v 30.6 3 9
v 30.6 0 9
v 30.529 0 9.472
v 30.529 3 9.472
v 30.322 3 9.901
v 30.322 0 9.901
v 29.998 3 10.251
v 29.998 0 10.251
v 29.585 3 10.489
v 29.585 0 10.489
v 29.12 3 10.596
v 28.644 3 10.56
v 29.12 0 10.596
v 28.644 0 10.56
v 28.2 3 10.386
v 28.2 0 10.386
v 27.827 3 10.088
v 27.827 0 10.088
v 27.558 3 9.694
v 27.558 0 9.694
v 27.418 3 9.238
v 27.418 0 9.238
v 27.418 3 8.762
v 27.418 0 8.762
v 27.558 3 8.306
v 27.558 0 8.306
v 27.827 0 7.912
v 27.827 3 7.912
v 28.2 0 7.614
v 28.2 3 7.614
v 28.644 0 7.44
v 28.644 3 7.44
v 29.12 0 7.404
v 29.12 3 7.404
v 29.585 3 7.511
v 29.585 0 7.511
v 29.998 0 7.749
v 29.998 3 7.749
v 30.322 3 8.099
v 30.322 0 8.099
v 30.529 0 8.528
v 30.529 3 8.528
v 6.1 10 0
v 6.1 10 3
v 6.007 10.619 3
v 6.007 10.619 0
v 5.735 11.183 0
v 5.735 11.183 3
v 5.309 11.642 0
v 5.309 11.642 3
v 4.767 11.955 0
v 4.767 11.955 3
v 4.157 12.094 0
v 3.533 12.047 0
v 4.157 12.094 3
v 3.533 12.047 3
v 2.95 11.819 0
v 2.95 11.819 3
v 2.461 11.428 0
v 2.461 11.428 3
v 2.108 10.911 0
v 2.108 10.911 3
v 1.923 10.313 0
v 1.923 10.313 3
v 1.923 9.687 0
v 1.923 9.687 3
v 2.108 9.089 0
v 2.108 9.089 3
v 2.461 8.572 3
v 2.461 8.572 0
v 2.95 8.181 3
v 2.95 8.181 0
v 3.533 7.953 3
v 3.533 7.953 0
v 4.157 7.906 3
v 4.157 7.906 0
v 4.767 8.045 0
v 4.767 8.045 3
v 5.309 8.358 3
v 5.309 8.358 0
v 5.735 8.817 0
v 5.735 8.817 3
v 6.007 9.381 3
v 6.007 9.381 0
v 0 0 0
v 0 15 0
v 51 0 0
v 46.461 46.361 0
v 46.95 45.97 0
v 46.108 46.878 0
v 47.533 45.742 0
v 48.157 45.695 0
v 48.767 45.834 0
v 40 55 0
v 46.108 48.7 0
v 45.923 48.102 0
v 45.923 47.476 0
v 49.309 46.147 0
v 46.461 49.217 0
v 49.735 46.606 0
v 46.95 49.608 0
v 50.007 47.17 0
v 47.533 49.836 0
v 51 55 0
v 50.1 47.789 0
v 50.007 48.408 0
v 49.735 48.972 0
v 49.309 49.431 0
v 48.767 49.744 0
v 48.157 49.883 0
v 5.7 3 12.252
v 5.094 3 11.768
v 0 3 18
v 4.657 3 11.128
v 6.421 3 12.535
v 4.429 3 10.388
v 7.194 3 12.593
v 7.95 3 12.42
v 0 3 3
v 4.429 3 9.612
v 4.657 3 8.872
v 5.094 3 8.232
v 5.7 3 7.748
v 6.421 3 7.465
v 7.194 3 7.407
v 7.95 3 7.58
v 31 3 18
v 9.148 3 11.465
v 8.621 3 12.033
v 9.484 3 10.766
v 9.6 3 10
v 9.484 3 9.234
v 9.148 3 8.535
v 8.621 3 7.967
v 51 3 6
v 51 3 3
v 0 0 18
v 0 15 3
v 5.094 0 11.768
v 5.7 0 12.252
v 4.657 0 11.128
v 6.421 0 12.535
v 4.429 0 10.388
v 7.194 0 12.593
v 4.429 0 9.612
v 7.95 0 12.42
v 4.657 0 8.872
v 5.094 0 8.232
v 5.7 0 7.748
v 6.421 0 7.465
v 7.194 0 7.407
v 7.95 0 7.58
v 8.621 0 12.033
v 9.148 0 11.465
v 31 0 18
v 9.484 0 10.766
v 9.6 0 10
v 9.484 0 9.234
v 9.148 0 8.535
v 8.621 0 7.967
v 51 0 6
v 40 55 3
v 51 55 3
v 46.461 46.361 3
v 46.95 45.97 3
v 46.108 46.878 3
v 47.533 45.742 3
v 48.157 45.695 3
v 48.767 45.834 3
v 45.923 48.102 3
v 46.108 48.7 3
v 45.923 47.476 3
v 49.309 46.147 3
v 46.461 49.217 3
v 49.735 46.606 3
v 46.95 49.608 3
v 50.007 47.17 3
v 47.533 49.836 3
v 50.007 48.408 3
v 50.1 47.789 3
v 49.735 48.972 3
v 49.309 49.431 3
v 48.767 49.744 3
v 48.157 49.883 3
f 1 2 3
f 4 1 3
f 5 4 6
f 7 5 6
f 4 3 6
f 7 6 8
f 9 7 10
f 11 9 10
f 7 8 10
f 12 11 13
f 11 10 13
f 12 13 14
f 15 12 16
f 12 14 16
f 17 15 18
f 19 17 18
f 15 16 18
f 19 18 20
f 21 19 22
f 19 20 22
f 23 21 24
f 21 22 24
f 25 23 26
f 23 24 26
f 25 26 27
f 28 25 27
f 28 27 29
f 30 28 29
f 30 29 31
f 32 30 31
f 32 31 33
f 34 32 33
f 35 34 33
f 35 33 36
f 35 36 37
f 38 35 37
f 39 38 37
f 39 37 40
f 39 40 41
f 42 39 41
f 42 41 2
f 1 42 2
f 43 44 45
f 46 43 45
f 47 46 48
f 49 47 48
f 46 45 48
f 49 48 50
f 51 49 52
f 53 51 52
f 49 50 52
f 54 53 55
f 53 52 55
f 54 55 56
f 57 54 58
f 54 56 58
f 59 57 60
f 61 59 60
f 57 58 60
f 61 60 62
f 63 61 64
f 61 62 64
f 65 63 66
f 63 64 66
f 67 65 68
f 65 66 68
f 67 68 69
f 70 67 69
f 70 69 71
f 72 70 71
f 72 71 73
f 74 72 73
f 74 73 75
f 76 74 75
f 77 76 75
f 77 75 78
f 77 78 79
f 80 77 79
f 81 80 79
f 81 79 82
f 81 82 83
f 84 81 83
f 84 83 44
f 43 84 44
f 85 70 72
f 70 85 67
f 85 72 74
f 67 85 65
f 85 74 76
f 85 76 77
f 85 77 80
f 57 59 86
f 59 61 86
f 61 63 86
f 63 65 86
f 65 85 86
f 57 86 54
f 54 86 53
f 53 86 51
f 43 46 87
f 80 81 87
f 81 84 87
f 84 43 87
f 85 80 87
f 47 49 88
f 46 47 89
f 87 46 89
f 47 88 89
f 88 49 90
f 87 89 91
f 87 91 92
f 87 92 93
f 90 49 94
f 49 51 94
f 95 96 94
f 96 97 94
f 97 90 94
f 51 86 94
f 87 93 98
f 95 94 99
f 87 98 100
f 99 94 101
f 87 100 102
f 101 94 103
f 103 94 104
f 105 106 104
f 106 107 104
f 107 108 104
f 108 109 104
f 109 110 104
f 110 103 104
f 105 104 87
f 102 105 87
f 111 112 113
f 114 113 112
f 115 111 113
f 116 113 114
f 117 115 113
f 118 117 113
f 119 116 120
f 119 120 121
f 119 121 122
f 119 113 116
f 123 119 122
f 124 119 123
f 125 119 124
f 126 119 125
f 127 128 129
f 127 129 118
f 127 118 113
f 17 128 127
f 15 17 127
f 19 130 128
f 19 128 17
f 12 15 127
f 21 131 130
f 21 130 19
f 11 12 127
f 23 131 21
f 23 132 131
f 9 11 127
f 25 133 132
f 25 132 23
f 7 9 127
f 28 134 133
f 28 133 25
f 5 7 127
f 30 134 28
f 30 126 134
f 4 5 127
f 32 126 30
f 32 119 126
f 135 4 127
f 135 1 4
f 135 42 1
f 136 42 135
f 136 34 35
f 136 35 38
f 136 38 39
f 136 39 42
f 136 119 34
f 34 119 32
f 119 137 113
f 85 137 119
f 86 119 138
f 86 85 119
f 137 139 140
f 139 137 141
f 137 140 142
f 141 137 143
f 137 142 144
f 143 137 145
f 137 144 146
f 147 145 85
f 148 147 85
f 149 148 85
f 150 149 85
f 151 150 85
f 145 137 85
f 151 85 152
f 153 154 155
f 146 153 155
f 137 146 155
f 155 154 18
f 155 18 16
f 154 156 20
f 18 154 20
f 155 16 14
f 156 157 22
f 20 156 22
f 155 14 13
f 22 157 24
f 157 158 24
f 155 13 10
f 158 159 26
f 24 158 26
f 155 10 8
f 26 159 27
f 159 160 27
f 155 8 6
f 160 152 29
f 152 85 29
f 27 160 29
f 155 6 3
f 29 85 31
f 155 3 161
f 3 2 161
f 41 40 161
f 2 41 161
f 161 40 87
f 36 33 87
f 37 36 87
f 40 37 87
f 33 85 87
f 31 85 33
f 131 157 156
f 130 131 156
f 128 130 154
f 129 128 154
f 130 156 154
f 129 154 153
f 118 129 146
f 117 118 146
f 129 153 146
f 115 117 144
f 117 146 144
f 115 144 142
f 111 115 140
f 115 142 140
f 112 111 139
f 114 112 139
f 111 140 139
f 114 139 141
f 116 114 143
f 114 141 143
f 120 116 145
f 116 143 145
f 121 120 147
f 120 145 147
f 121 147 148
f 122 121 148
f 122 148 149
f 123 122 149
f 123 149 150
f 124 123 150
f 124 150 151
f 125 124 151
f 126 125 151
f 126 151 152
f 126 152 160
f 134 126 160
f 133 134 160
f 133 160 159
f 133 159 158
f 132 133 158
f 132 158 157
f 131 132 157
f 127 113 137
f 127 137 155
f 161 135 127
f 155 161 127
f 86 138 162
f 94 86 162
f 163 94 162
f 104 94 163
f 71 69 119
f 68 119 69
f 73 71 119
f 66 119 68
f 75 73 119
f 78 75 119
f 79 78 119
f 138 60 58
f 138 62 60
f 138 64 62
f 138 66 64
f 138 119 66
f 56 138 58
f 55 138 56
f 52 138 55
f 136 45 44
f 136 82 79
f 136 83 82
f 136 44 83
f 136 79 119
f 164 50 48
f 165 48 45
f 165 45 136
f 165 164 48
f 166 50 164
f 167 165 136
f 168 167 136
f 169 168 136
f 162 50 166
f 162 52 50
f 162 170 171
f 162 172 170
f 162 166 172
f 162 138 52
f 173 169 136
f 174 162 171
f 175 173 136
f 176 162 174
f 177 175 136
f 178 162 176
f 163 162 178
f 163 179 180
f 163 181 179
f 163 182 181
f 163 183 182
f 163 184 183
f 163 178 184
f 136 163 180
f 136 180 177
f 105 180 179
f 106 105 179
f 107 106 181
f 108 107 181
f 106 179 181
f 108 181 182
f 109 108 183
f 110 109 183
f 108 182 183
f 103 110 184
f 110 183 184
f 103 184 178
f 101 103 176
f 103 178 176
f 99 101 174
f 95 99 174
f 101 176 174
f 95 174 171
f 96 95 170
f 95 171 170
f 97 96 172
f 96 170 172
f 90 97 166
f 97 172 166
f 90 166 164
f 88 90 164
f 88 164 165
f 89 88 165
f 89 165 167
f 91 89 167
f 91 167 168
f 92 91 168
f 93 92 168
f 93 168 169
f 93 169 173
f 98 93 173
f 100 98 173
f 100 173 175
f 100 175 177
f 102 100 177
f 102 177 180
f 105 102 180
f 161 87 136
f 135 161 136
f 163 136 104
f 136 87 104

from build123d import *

# Parameters (mm, degrees)
F0_W      = 51
F0_H      = 55
F1_DEPTH  = 3
F2_W      = 51
F2_H      = 3
F3_DEPTH  = 15
F4_R      = 2.6
F4_R_2    = 1.6
F5_DEPTH  = 25
F6_R      = 2.1
F7_DEPTH  = 25
F9_DEPTH  = 25
F11_DEPTH = 25


with BuildPart() as f1:
    # F0 (on Top) → F1 (new body)
    with BuildSketch(Plane.XY):
        with Locations((25.5, 27.5)):
            Rectangle(F0_W, F0_H)
    extrude(amount=F1_DEPTH)

    # F2 (on face) → F3 (join)
    with BuildSketch(Plane.XY.offset(3)):
        with Locations((25.5, 1.5)):
            Rectangle(F2_W, F2_H)
    extrude(amount=F3_DEPTH)

    # F4 (on face) → F5 (cut)
    with BuildSketch(Plane.XZ):
        with Locations((7, 10)):
            Circle(F4_R)
        with Locations((29, 9)):
            Circle(F4_R_2)
    extrude(amount=-F5_DEPTH, mode=Mode.SUBTRACT)

    # F6 (on face) → F7 (cut)
    with BuildSketch(Plane.XY.offset(3)):
        with Locations((4, 10)):
            Circle(F6_R)
        with Locations((48, 47.788887)):
            Circle(F6_R)
    extrude(amount=-F7_DEPTH, mode=Mode.SUBTRACT)

    # F8 (on face) → F9 (cut)
    with BuildSketch(Plane.XY.offset(3)):
        Polygon((0, 15), (40, 55), (0, 55), align=None)
    extrude(amount=-F9_DEPTH, mode=Mode.SUBTRACT)

    # F10 (on face) → F11 (cut)
    with BuildSketch(Plane(origin=(0, 3, 0), x_dir=(-1, 0, 0), z_dir=(0, 1, 0))):
        Polygon((-51, 6), (-31, 18), (-51, 18), align=None)
    extrude(amount=-F11_DEPTH, mode=Mode.SUBTRACT)


solid = f1.part
